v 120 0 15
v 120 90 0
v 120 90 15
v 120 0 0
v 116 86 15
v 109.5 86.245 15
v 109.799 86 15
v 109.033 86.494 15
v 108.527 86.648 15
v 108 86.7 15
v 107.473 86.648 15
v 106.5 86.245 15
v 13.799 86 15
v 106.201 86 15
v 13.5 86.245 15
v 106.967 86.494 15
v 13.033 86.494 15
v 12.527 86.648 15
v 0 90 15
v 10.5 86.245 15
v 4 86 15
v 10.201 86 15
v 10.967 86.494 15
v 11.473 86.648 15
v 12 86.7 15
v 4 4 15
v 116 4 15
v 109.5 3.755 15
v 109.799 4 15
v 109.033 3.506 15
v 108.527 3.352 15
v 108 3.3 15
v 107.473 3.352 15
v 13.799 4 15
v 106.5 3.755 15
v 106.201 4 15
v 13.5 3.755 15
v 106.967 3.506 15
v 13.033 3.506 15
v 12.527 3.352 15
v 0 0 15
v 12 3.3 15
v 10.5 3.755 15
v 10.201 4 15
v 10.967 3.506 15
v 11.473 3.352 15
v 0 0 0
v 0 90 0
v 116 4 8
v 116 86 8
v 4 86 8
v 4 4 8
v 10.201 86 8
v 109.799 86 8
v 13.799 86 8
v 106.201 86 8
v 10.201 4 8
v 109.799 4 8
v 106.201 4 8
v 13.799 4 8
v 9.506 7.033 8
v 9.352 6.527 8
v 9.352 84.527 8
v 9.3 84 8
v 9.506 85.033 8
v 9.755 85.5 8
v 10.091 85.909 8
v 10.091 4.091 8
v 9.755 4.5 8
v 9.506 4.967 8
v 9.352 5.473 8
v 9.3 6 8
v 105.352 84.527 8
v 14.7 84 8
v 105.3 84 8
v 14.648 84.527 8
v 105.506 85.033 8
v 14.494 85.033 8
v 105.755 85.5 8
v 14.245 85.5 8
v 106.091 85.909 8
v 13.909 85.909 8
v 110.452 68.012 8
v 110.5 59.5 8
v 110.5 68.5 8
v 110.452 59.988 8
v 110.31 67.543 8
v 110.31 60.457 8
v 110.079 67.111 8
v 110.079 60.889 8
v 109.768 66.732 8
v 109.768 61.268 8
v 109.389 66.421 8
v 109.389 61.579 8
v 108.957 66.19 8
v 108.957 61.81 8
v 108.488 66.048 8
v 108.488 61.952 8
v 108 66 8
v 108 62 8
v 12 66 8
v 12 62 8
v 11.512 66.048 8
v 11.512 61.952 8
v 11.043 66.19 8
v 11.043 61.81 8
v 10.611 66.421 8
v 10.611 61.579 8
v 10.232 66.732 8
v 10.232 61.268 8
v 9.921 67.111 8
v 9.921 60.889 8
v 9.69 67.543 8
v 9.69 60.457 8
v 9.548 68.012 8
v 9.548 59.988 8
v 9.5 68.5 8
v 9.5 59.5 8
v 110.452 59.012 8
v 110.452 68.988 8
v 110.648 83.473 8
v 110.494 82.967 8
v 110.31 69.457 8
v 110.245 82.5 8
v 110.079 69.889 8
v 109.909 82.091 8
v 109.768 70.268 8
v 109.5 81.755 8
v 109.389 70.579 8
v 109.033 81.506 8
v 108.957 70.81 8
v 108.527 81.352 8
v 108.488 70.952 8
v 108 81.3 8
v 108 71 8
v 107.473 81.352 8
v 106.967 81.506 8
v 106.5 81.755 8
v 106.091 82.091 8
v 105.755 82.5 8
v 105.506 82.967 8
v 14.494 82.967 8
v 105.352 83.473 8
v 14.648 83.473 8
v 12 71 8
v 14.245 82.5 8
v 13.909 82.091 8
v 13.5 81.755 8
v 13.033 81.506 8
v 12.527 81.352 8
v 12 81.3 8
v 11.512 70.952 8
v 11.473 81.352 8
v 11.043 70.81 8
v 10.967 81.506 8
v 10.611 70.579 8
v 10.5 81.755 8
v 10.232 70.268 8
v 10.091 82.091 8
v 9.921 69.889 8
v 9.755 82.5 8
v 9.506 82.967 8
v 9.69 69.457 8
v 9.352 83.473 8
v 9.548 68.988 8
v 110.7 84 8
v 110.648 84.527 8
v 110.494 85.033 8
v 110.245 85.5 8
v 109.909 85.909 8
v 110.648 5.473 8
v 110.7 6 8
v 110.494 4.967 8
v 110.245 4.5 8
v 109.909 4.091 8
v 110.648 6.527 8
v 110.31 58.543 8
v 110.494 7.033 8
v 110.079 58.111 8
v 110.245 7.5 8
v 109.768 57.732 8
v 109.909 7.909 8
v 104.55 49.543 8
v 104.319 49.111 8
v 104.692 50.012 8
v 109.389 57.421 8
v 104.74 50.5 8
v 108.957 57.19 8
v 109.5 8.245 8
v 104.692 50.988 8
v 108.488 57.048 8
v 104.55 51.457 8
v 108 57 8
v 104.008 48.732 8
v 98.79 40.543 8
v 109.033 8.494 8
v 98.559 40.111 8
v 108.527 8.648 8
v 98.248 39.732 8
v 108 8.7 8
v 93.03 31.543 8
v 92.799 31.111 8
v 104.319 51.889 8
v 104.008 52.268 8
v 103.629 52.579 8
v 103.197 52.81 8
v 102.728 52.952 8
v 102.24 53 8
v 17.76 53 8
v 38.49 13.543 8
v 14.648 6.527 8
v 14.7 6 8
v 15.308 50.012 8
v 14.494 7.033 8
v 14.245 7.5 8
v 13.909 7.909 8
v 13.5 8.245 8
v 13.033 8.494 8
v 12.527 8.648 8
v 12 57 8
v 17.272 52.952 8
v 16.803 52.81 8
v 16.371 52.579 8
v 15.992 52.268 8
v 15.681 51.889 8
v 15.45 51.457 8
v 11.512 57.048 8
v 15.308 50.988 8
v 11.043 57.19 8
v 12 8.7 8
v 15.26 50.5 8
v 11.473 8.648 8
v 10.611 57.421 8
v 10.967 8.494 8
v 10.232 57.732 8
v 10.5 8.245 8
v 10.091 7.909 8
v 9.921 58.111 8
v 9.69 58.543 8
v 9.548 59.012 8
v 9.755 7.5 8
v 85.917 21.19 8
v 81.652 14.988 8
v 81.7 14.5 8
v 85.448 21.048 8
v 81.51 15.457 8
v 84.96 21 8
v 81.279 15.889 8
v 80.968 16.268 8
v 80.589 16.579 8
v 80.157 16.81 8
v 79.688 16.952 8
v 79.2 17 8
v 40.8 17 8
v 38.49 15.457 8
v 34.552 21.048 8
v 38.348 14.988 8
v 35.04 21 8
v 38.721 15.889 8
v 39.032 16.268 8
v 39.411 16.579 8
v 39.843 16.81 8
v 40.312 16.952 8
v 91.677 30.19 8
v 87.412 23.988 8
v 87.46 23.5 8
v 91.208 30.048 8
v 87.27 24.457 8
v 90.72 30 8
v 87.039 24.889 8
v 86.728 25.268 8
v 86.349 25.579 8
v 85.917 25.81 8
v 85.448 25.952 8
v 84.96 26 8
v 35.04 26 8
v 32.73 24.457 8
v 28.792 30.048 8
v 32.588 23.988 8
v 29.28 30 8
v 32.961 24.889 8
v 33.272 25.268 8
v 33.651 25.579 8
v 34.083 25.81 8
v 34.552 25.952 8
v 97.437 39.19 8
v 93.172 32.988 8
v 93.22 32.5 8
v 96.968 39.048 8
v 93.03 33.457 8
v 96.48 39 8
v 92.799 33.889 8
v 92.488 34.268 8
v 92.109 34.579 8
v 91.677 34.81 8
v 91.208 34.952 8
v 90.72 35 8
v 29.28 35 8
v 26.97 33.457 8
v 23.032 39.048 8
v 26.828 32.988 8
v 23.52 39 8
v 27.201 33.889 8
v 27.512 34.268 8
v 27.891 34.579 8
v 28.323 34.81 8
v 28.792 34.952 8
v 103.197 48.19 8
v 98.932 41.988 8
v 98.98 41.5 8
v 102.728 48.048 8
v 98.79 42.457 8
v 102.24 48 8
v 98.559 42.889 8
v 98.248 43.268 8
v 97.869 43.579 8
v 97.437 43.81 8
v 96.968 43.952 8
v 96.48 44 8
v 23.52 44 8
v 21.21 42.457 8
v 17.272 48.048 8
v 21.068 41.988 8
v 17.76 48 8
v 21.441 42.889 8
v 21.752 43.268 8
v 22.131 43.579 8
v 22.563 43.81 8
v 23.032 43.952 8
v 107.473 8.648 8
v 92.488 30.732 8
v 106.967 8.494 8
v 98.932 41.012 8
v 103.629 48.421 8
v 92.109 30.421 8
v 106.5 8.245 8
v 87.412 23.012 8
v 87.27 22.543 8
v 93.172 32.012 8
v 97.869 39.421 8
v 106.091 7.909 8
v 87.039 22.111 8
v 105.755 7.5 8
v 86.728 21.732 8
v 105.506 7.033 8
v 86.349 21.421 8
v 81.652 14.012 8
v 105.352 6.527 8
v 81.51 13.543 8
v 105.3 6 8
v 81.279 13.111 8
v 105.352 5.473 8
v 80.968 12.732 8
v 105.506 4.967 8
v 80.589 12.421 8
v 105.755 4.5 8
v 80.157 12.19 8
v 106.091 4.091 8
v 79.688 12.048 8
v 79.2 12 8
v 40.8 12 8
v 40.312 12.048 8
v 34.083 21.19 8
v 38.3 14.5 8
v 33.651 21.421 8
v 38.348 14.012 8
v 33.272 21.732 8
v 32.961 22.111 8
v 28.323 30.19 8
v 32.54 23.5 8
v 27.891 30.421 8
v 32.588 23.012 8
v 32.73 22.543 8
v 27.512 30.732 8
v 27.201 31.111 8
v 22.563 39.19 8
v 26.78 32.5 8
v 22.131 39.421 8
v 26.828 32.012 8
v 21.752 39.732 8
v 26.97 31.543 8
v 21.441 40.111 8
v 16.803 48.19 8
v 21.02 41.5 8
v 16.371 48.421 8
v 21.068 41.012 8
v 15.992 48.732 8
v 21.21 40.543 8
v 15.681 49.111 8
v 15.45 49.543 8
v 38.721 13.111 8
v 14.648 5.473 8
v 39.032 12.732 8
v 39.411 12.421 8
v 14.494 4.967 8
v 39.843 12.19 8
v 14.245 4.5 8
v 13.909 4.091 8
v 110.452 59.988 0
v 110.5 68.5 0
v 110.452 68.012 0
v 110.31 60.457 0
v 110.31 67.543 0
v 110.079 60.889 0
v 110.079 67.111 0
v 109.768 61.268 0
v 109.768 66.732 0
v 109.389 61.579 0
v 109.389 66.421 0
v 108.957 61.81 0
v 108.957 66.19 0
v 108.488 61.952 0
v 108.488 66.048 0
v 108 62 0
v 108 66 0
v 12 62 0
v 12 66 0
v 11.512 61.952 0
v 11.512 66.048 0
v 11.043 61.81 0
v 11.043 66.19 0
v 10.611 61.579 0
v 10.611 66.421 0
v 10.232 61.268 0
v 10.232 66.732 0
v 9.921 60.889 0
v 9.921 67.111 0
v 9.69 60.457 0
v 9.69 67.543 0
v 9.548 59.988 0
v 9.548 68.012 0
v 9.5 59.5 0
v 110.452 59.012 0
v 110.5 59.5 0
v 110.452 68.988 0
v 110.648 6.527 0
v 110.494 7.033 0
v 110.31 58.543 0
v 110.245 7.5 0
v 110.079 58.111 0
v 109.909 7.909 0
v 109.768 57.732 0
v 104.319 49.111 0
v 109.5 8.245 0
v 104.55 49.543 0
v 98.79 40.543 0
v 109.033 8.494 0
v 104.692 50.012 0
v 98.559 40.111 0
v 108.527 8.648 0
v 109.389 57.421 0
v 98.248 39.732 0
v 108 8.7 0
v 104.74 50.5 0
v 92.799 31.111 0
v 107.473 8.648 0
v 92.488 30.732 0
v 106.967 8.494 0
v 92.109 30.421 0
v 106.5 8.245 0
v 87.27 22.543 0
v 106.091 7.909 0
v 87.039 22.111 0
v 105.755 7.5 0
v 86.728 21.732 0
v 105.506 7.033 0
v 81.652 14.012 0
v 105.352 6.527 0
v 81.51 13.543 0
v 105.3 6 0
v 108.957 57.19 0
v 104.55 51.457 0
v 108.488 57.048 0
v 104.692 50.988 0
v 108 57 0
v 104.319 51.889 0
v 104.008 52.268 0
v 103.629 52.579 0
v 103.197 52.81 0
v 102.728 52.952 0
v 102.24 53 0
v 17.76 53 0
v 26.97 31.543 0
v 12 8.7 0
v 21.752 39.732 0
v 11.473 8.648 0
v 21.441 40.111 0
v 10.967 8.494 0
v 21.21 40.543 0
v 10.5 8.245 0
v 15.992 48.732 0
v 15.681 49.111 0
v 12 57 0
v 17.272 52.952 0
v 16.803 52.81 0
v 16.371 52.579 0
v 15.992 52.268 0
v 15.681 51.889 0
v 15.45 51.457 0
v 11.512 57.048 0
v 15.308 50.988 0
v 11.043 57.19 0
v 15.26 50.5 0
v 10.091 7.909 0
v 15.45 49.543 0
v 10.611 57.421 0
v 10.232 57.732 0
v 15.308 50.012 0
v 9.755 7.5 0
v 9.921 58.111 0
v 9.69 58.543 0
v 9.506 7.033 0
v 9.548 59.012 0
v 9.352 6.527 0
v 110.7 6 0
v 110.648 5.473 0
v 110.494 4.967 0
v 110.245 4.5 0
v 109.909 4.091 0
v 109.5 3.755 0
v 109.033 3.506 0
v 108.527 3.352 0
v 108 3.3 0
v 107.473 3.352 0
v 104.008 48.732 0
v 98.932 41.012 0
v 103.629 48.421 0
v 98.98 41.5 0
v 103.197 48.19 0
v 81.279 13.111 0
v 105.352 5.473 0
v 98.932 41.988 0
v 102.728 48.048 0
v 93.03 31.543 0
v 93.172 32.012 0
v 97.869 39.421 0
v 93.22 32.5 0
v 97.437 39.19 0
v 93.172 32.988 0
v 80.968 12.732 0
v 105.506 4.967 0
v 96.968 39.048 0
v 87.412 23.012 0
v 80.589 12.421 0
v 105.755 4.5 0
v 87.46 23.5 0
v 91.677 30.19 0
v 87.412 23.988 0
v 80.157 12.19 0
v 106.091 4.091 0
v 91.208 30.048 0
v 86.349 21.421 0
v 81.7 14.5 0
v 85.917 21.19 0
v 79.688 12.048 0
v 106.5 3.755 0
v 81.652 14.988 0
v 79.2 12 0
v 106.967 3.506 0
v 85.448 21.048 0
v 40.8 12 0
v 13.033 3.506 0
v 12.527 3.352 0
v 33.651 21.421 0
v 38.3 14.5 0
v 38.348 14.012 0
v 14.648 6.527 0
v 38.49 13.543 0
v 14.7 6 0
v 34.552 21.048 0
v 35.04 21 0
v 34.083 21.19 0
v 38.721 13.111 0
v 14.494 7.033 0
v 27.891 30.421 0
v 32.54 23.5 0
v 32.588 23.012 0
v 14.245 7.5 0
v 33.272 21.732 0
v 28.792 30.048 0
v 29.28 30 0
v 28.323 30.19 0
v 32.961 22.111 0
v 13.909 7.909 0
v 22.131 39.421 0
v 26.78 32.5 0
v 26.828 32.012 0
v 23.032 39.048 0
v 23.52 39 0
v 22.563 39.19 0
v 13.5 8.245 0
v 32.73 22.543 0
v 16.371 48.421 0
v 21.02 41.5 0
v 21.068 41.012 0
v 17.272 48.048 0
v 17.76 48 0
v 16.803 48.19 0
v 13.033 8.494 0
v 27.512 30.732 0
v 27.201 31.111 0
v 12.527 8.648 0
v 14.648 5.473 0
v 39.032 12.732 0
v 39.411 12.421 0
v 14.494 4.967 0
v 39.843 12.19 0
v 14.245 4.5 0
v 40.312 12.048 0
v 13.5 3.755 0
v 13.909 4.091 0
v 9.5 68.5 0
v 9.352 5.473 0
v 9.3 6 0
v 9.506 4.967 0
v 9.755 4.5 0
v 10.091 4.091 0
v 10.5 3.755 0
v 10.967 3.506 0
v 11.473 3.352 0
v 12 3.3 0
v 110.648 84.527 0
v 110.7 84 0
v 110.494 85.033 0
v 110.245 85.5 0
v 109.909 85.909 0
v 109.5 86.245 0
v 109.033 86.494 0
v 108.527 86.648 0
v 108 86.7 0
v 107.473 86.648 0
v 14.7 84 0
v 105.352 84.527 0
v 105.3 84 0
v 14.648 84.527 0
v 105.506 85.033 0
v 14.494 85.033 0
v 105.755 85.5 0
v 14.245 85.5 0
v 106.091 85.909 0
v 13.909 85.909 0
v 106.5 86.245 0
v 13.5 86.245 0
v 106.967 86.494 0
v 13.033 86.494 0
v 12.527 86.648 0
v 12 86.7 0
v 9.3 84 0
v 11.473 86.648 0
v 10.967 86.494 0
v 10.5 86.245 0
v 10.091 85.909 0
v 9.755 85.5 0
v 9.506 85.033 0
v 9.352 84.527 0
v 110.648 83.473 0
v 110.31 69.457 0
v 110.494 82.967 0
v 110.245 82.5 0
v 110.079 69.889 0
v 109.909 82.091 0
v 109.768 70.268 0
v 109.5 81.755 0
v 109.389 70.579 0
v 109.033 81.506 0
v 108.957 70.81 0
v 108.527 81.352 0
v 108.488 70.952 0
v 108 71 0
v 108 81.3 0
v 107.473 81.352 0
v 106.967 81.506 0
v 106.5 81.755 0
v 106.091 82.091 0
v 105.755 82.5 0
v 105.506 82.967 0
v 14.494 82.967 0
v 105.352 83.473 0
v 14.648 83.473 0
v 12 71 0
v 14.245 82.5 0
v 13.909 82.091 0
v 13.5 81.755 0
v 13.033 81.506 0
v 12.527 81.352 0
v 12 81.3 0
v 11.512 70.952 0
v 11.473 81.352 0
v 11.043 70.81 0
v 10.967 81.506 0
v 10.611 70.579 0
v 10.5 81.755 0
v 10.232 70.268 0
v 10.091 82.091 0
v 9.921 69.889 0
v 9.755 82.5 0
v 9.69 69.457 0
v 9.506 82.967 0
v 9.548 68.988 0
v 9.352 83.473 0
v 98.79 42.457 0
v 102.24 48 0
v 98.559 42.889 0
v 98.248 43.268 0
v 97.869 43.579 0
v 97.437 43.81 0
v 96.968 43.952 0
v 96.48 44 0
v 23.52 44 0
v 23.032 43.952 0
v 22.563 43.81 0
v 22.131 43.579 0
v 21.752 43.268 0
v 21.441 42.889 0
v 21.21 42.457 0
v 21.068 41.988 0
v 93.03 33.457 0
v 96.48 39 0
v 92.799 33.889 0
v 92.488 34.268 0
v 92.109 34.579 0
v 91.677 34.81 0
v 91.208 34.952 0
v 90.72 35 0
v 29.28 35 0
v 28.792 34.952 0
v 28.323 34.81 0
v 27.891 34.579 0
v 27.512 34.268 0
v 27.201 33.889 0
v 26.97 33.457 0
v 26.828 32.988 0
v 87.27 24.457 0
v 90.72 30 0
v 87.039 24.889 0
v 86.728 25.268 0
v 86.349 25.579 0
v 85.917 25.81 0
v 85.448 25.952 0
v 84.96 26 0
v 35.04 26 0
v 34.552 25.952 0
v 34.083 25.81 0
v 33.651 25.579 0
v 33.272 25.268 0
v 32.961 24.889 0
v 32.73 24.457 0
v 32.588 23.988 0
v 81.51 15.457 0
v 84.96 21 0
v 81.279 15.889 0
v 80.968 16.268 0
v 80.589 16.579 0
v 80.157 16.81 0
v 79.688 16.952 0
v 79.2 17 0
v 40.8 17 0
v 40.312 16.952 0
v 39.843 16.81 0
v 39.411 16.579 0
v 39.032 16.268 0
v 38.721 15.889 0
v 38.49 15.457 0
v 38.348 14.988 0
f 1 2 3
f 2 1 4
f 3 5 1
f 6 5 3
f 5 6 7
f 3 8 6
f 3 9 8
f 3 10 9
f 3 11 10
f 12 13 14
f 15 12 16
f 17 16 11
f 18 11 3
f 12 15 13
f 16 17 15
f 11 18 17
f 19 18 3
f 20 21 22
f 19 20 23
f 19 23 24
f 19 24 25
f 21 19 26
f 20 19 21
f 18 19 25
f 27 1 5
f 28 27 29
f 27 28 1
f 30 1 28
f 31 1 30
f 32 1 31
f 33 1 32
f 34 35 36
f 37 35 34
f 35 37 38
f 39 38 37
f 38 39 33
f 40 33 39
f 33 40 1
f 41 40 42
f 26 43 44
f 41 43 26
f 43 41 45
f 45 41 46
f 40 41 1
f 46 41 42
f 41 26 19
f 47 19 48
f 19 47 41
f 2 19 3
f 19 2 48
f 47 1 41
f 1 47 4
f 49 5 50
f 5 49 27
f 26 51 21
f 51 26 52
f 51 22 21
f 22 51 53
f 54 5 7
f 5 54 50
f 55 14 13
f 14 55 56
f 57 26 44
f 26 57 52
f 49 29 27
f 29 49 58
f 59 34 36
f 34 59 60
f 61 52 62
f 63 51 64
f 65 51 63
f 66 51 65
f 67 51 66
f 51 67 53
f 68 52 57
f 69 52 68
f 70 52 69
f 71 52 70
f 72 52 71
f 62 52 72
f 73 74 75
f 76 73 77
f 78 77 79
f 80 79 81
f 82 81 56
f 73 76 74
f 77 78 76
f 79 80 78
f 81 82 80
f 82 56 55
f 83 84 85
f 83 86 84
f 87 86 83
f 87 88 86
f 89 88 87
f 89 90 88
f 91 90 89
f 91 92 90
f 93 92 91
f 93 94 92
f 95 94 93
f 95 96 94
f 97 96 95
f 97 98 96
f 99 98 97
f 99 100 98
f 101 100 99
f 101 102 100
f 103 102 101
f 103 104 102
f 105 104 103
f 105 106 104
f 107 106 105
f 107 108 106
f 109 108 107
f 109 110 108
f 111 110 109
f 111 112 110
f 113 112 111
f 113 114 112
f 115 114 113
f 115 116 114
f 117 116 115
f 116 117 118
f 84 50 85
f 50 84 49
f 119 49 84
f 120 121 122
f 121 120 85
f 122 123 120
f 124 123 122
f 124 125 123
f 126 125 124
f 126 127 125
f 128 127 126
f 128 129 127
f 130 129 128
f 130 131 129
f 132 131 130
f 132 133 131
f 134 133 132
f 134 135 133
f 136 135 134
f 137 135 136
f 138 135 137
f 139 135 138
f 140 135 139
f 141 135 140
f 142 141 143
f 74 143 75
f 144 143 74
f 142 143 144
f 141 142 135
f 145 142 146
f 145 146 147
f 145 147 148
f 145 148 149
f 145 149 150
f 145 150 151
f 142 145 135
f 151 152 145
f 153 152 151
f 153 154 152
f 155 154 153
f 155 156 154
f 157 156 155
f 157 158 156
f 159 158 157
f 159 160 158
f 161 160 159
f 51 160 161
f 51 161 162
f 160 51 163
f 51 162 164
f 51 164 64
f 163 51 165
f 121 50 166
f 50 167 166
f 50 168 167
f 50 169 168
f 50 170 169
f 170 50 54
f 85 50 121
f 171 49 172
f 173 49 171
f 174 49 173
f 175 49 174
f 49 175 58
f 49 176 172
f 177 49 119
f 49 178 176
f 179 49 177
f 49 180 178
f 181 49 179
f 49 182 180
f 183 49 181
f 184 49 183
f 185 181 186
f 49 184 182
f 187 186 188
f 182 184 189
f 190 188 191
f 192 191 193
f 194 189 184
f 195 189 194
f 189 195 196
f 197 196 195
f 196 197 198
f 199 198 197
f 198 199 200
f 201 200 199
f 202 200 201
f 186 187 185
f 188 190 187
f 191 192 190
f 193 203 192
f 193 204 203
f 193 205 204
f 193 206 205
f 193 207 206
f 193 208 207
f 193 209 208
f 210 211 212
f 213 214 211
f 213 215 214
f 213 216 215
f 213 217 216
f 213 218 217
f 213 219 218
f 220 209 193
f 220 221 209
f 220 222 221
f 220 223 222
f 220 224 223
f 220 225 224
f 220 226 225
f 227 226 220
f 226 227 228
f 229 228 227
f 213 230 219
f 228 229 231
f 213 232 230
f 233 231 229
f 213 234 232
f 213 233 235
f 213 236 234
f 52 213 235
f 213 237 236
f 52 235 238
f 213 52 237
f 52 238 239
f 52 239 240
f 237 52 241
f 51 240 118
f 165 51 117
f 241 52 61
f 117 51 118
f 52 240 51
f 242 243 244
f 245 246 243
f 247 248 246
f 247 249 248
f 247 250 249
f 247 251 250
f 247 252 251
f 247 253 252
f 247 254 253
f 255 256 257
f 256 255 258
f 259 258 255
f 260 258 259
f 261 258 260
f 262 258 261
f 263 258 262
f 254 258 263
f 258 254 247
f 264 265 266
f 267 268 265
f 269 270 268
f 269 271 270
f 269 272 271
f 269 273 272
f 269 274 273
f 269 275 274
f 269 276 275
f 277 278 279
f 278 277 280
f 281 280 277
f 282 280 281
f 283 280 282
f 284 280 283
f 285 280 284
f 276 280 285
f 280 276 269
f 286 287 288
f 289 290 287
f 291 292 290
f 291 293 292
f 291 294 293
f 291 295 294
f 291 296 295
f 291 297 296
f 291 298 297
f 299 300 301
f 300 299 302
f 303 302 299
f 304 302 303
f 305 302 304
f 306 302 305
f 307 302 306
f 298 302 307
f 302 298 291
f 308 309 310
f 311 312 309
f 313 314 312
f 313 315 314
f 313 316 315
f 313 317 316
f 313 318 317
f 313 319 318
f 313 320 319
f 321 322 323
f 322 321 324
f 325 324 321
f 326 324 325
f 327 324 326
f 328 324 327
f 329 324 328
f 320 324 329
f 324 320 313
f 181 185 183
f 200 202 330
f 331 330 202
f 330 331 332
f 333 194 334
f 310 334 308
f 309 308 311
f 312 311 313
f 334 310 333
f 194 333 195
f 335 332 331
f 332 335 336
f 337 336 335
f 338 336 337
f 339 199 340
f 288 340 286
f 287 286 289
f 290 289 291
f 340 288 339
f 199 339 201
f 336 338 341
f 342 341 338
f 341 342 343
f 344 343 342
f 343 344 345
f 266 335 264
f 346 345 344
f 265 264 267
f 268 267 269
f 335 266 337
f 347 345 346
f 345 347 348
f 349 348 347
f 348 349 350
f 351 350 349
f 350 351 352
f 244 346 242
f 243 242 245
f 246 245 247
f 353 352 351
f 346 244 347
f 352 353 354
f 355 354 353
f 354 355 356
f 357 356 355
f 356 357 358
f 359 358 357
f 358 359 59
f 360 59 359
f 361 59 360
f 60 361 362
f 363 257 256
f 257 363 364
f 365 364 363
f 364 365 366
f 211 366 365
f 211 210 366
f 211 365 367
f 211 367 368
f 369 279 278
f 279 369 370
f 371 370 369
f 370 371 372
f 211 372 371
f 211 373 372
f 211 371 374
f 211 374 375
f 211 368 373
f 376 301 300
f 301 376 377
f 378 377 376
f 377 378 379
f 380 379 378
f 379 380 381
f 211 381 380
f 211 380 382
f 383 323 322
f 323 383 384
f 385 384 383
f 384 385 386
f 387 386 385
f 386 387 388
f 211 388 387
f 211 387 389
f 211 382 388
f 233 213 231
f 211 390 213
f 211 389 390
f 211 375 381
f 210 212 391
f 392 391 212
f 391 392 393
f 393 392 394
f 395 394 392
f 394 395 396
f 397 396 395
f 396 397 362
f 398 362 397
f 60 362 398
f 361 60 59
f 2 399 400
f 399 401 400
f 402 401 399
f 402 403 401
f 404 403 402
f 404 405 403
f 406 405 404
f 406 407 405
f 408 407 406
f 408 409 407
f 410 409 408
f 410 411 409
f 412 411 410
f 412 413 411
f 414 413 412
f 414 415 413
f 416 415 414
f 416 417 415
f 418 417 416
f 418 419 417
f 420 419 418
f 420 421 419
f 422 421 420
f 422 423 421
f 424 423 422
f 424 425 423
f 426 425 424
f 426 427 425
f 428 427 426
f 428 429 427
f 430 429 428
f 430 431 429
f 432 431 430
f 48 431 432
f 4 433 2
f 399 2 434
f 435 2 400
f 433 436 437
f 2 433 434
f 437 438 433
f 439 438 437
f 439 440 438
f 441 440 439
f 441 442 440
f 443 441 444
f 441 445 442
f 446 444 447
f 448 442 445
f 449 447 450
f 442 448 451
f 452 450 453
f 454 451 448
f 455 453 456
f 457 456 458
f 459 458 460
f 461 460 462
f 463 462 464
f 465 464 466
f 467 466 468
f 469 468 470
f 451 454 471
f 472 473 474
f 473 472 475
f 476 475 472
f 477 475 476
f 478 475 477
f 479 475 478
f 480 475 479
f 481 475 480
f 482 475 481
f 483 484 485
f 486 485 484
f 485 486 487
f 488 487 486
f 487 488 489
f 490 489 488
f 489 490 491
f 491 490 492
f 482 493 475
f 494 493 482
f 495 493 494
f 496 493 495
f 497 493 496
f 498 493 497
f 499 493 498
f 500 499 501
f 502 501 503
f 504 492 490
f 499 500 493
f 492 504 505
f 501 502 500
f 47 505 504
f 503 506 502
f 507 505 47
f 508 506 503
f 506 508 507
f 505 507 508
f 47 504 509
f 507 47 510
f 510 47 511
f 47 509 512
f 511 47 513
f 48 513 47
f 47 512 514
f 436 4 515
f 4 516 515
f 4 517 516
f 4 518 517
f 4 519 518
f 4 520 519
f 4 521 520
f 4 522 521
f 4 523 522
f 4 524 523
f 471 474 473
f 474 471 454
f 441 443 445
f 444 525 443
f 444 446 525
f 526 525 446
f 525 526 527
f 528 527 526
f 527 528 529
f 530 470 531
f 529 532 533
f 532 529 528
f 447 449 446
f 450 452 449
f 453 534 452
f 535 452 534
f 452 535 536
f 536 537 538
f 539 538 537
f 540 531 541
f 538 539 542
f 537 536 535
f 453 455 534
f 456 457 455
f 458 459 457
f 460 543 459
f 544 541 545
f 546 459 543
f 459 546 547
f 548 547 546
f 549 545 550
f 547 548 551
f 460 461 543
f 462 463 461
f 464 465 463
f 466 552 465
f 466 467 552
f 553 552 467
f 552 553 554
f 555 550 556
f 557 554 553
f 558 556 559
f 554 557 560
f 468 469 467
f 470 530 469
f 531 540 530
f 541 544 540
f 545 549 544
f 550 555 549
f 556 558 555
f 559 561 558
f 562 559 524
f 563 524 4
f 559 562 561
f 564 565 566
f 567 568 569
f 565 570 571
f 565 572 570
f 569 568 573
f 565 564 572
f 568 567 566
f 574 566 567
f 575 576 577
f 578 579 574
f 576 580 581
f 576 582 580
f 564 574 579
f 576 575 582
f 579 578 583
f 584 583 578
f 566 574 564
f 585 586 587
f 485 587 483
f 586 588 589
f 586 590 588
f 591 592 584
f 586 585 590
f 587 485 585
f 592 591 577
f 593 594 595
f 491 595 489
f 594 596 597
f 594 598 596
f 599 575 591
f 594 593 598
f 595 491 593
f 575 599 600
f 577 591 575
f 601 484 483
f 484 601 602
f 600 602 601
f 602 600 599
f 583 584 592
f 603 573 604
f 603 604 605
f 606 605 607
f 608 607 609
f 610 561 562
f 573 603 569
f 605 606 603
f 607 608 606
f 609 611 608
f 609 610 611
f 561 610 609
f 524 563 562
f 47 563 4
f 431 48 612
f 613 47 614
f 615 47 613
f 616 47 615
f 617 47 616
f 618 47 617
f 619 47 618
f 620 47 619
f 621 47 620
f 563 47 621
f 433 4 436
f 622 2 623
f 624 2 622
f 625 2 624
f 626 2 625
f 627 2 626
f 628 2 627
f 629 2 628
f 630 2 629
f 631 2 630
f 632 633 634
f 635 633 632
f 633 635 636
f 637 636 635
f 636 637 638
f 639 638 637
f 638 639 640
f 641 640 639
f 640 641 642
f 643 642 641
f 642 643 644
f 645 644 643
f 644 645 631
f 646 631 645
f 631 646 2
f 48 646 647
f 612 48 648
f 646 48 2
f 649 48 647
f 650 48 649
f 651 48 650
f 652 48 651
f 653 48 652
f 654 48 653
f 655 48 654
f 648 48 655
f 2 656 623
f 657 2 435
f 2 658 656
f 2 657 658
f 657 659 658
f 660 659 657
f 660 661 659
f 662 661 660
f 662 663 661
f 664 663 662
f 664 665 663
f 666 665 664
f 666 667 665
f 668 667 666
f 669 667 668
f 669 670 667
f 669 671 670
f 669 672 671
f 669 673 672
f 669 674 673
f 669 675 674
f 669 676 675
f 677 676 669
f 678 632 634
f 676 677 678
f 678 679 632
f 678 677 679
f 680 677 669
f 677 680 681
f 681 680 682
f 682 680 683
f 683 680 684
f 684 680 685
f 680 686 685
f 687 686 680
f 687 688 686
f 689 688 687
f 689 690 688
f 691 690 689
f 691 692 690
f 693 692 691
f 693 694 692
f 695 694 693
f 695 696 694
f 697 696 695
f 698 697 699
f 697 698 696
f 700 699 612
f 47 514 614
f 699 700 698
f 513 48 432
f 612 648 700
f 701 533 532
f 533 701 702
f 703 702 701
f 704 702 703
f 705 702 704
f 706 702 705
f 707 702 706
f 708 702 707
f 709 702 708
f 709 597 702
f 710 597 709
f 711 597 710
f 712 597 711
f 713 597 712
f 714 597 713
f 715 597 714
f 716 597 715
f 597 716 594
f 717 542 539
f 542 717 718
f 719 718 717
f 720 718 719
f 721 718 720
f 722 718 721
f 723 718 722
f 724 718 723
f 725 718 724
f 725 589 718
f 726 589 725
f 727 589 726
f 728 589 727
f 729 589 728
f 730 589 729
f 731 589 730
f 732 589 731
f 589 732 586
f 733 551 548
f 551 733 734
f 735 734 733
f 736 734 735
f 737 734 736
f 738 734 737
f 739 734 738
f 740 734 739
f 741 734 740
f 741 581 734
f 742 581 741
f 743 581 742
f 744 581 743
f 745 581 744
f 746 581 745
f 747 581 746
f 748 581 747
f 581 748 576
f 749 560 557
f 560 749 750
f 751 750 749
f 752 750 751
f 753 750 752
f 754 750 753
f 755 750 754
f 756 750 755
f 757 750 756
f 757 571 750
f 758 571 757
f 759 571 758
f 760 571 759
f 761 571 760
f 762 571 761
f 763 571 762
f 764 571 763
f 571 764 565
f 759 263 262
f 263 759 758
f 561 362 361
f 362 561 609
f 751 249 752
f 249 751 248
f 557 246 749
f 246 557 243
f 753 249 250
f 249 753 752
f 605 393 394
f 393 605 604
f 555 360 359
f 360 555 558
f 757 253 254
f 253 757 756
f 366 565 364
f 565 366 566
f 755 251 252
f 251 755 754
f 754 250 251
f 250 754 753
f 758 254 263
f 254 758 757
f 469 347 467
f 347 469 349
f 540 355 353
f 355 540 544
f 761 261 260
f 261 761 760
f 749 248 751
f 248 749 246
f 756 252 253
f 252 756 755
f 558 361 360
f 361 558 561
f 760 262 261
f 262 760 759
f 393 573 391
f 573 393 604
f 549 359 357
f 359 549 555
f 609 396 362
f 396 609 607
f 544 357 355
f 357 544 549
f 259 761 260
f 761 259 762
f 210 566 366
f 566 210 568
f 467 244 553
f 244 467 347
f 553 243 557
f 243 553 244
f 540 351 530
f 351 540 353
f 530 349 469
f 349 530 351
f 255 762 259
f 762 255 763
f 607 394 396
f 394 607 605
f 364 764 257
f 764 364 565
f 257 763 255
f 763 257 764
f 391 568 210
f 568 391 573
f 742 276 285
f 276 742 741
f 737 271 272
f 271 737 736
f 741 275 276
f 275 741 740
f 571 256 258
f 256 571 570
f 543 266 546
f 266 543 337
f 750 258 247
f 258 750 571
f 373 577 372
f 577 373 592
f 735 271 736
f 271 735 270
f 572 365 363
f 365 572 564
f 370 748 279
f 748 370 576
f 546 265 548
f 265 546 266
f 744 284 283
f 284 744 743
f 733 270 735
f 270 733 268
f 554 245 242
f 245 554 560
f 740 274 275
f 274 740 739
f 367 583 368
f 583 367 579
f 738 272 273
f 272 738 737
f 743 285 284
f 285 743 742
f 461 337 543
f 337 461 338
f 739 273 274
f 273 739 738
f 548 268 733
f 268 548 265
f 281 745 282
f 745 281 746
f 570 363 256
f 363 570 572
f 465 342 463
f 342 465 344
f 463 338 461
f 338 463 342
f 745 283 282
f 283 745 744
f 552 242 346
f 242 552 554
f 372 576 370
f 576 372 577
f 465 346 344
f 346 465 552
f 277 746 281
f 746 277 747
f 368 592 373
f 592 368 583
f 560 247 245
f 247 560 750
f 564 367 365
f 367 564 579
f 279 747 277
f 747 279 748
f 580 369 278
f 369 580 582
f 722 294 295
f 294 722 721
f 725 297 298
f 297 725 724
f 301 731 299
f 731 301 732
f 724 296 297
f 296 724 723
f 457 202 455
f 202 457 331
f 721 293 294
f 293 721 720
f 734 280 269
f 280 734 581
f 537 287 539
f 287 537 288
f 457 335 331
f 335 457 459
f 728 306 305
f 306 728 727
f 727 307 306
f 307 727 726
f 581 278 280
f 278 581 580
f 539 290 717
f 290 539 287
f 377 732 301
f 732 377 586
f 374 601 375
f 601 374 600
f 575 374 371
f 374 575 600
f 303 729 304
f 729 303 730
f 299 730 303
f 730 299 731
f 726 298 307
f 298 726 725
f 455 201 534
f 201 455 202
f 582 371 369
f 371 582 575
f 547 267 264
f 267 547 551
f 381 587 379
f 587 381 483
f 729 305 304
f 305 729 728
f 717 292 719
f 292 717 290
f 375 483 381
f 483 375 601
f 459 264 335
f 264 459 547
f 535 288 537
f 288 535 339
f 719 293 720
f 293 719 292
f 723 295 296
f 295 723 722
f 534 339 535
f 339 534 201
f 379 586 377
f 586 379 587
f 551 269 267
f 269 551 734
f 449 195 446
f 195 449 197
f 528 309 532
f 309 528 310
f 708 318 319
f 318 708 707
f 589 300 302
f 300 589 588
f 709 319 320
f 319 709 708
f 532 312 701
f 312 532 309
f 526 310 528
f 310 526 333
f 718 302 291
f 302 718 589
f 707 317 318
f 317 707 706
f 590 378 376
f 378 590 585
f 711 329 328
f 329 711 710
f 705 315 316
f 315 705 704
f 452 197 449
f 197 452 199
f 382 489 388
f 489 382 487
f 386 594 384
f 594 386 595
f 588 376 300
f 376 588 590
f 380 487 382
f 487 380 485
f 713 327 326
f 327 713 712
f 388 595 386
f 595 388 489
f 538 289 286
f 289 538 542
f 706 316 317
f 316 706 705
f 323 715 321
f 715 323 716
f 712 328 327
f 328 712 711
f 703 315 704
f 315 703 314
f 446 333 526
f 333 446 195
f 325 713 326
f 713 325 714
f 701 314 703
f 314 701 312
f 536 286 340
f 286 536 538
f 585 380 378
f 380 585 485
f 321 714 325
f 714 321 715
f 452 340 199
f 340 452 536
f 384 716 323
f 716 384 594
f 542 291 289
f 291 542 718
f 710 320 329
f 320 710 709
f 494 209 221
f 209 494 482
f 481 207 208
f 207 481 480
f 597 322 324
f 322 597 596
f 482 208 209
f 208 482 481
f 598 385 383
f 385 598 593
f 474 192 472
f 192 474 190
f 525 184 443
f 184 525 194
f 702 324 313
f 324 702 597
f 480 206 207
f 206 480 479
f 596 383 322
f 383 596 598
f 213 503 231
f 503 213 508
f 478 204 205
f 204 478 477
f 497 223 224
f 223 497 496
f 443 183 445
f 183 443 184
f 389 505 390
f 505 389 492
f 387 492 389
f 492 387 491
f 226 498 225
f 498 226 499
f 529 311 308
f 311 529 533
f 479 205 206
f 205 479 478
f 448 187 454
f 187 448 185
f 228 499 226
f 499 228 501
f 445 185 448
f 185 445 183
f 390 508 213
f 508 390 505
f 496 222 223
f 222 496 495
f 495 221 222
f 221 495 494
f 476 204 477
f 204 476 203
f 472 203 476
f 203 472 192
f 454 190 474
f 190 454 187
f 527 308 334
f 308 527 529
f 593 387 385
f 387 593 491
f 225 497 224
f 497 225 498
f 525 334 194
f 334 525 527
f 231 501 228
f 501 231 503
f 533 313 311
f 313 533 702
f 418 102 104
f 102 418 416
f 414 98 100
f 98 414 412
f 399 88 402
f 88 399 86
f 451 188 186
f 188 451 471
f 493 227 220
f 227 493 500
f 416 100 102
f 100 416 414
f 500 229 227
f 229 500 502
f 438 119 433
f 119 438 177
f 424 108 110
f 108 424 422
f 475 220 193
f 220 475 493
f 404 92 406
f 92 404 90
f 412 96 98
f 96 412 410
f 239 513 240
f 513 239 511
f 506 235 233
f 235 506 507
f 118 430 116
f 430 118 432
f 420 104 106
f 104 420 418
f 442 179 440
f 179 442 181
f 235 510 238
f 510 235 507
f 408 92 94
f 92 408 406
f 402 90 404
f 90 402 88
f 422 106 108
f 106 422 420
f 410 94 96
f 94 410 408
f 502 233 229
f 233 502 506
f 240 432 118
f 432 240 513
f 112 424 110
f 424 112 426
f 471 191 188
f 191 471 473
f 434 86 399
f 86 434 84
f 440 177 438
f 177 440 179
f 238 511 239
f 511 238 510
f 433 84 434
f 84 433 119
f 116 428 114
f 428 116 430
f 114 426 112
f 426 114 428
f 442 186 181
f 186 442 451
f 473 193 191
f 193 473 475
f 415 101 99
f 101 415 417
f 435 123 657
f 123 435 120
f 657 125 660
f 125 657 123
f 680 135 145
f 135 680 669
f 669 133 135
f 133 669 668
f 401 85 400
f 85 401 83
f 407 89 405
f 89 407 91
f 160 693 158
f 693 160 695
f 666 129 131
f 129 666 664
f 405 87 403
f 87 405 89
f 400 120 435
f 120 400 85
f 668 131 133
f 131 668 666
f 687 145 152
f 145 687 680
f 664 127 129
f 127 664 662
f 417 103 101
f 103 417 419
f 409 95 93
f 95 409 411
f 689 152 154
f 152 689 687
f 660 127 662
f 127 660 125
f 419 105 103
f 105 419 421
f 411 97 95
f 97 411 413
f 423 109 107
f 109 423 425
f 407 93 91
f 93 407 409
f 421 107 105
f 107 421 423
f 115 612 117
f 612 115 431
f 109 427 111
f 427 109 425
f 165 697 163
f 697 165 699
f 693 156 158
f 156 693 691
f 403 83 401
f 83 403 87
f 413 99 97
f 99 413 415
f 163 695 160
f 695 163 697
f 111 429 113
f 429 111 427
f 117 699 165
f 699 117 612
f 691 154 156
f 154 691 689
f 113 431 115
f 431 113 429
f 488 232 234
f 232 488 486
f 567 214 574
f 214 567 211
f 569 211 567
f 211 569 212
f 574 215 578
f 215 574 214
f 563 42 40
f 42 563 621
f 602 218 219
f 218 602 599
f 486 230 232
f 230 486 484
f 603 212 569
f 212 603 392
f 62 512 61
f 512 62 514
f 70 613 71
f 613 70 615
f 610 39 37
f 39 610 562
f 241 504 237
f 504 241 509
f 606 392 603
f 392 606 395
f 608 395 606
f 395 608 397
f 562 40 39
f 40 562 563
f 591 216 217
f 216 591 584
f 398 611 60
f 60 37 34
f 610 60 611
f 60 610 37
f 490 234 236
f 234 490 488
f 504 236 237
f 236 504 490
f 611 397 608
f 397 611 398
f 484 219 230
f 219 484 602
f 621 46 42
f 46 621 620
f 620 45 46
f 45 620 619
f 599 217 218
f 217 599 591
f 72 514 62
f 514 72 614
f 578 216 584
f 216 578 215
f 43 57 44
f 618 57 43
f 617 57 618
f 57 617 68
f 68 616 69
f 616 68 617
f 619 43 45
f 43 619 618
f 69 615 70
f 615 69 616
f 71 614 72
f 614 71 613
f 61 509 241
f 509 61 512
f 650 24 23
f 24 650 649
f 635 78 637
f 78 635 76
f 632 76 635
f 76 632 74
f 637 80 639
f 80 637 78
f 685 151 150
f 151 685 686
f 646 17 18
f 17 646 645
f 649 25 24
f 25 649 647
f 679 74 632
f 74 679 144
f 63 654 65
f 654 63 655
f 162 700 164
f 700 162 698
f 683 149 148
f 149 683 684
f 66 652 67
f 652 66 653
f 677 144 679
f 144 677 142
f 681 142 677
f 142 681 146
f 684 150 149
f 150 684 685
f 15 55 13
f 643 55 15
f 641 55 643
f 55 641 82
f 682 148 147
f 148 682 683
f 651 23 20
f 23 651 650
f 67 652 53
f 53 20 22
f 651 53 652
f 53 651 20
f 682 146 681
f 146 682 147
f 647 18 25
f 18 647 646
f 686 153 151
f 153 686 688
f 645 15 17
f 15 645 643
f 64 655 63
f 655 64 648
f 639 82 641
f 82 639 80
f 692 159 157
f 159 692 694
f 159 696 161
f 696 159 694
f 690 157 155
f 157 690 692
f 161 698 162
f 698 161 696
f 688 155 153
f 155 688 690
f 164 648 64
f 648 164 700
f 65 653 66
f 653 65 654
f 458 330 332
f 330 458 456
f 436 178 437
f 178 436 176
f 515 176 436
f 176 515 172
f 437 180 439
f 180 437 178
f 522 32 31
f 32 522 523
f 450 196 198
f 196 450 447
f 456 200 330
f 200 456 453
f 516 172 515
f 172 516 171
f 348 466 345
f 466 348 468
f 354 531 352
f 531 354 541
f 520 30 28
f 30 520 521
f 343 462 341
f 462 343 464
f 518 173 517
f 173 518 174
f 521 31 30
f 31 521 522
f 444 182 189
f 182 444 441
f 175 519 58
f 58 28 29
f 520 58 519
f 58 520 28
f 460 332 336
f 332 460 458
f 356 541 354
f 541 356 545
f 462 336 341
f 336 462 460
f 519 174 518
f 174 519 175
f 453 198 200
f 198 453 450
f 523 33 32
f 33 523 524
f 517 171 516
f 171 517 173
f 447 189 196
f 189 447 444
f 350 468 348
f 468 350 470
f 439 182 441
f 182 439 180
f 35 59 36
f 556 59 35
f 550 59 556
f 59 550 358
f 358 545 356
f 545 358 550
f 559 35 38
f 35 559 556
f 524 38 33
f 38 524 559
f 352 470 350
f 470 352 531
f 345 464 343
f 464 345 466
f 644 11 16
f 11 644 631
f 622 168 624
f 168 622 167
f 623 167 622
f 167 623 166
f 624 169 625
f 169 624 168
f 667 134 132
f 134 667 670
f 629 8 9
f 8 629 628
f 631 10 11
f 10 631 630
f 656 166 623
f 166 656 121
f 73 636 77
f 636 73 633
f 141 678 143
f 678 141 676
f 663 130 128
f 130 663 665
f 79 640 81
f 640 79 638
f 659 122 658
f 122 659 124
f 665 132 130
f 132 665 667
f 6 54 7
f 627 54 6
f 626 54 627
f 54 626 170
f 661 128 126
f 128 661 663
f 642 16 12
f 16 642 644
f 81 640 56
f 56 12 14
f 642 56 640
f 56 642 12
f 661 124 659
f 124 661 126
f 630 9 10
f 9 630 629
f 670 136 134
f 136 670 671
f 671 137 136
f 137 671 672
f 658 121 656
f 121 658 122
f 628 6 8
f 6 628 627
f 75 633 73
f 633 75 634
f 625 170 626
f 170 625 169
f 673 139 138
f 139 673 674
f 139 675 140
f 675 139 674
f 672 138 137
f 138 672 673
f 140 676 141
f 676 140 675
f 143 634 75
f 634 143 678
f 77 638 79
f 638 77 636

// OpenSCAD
$fn = 32;

// ----------------------------------------------------------------------
// Slotted panel: 120 x 90 mm, 7 рядов of slots
// ----------------------------------------------------------------------

// --- parameters (mm) ---
panel_w = 120;            // panel width
panel_d = 90;             // panel depth
thick = 8;                // panel thickness
slot_w = 5;               // slot width
pitch0 = 9;               // first row pitch
pitch_step = 2.4;         // pitch increase per row
margin = 12;              // margin around the slot field
rows = 7;                 // number of slot rows
mount_d = 5.4;            // mounting holes
mount_x = 48;             // mounting hole offset
rim_h = 15;               // rim height
rim_t = 4;                // rim wall thickness

difference() {
  union() {
    cube([panel_w, panel_d, thick]);
    translate([0, 0, thick - 1]) difference() {
      cube([panel_w, panel_d, rim_h - thick + 1]);
      translate([rim_t, rim_t, -2.5]) cube([panel_w - 2 * rim_t, panel_d - 2 * rim_t, rim_h - thick + 6]);
    }
  }
  /* slot rows: stadium shaped cutters, 2.5 mm clear of both faces */
  /* row 0: pitch 9, length 38.4 */
  hull() {
    translate([40.8, 14.5, -2.5]) cylinder(h = thick + 5, d = slot_w);
    translate([79.2, 14.5, -2.5]) cylinder(h = thick + 5, d = slot_w);
  }
  /* row 1: pitch 9, length 49.92 */
  hull() {
    translate([35.04, 23.5, -2.5]) cylinder(h = thick + 5, d = slot_w);
    translate([84.96, 23.5, -2.5]) cylinder(h = thick + 5, d = slot_w);
  }
  /* row 2: pitch 9, length 61.44 */
  hull() {
    translate([29.28, 32.5, -2.5]) cylinder(h = thick + 5, d = slot_w);
    translate([90.72, 32.5, -2.5]) cylinder(h = thick + 5, d = slot_w);
  }
  /* row 3: pitch 9, length 72.96 */
  hull() {
    translate([23.52, 41.5, -2.5]) cylinder(h = thick + 5, d = slot_w);
    translate([96.48, 41.5, -2.5]) cylinder(h = thick + 5, d = slot_w);
  }
  /* row 4: pitch 9, length 84.48 */
  hull() {
    translate([17.76, 50.5, -2.5]) cylinder(h = thick + 5, d = slot_w);
    translate([102.24, 50.5, -2.5]) cylinder(h = thick + 5, d = slot_w);
  }
  /* row 5: pitch 9, length 96 */
  hull() {
    translate([12, 59.5, -2.5]) cylinder(h = thick + 5, d = slot_w);
    translate([108, 59.5, -2.5]) cylinder(h = thick + 5, d = slot_w);
  }
  /* row 6: pitch 9, length 96 */
  hull() {
    translate([12, 68.5, -2.5]) cylinder(h = thick + 5, d = slot_w);
    translate([108, 68.5, -2.5]) cylinder(h = thick + 5, d = slot_w);
  }
  translate([12, 6, -2.5]) cylinder(h = 20, d = mount_d);
  translate([12, 84, -2.5]) cylinder(h = 20, d = mount_d);
  translate([108, 6, -2.5]) cylinder(h = 20, d = mount_d);
  translate([108, 84, -2.5]) cylinder(h = 20, d = mount_d);
}
